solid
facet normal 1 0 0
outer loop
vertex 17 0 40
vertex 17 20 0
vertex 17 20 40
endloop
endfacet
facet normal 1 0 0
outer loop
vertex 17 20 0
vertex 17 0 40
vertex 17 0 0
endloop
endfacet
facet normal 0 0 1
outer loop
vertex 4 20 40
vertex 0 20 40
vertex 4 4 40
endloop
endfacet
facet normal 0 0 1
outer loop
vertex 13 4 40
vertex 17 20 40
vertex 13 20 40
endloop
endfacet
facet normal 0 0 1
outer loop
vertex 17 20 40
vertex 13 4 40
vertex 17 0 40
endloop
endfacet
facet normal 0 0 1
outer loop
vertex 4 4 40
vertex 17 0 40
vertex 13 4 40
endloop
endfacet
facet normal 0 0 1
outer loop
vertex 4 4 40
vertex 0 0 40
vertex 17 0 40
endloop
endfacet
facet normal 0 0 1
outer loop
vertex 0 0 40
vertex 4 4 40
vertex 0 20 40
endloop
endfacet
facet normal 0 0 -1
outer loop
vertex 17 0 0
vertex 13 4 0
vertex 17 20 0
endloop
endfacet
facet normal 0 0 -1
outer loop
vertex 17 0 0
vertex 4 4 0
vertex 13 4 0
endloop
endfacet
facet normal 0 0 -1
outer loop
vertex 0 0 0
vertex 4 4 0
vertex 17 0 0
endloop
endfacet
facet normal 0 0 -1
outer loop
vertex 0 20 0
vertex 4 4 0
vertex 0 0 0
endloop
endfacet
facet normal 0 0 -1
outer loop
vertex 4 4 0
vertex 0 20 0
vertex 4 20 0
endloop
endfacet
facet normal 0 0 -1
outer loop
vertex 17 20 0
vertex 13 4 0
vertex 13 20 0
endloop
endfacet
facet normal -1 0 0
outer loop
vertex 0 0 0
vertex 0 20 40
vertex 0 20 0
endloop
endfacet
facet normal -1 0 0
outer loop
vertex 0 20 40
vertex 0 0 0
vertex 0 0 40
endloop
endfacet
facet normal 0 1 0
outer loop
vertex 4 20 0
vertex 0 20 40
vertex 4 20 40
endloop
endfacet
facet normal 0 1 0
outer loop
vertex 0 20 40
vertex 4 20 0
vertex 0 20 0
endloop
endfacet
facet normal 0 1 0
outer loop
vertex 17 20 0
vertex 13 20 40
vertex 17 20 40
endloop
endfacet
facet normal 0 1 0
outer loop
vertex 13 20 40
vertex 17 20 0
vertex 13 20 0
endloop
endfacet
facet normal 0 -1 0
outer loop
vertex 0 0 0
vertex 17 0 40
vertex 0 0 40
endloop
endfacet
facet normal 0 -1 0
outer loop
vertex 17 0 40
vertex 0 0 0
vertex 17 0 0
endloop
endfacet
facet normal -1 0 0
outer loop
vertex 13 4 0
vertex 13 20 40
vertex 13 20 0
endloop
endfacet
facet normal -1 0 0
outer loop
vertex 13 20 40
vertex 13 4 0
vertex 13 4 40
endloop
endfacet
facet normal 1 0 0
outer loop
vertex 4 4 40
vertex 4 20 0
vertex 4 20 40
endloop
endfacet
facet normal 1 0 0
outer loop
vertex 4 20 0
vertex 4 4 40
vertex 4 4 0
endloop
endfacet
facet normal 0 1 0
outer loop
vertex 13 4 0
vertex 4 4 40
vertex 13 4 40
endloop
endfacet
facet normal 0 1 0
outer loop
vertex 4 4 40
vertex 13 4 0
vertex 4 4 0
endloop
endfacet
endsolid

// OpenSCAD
difference() {
  cube([17, 20, 40]);
  
  translate([4, 4, -5])
    cube([9, 20, 50]);
}
